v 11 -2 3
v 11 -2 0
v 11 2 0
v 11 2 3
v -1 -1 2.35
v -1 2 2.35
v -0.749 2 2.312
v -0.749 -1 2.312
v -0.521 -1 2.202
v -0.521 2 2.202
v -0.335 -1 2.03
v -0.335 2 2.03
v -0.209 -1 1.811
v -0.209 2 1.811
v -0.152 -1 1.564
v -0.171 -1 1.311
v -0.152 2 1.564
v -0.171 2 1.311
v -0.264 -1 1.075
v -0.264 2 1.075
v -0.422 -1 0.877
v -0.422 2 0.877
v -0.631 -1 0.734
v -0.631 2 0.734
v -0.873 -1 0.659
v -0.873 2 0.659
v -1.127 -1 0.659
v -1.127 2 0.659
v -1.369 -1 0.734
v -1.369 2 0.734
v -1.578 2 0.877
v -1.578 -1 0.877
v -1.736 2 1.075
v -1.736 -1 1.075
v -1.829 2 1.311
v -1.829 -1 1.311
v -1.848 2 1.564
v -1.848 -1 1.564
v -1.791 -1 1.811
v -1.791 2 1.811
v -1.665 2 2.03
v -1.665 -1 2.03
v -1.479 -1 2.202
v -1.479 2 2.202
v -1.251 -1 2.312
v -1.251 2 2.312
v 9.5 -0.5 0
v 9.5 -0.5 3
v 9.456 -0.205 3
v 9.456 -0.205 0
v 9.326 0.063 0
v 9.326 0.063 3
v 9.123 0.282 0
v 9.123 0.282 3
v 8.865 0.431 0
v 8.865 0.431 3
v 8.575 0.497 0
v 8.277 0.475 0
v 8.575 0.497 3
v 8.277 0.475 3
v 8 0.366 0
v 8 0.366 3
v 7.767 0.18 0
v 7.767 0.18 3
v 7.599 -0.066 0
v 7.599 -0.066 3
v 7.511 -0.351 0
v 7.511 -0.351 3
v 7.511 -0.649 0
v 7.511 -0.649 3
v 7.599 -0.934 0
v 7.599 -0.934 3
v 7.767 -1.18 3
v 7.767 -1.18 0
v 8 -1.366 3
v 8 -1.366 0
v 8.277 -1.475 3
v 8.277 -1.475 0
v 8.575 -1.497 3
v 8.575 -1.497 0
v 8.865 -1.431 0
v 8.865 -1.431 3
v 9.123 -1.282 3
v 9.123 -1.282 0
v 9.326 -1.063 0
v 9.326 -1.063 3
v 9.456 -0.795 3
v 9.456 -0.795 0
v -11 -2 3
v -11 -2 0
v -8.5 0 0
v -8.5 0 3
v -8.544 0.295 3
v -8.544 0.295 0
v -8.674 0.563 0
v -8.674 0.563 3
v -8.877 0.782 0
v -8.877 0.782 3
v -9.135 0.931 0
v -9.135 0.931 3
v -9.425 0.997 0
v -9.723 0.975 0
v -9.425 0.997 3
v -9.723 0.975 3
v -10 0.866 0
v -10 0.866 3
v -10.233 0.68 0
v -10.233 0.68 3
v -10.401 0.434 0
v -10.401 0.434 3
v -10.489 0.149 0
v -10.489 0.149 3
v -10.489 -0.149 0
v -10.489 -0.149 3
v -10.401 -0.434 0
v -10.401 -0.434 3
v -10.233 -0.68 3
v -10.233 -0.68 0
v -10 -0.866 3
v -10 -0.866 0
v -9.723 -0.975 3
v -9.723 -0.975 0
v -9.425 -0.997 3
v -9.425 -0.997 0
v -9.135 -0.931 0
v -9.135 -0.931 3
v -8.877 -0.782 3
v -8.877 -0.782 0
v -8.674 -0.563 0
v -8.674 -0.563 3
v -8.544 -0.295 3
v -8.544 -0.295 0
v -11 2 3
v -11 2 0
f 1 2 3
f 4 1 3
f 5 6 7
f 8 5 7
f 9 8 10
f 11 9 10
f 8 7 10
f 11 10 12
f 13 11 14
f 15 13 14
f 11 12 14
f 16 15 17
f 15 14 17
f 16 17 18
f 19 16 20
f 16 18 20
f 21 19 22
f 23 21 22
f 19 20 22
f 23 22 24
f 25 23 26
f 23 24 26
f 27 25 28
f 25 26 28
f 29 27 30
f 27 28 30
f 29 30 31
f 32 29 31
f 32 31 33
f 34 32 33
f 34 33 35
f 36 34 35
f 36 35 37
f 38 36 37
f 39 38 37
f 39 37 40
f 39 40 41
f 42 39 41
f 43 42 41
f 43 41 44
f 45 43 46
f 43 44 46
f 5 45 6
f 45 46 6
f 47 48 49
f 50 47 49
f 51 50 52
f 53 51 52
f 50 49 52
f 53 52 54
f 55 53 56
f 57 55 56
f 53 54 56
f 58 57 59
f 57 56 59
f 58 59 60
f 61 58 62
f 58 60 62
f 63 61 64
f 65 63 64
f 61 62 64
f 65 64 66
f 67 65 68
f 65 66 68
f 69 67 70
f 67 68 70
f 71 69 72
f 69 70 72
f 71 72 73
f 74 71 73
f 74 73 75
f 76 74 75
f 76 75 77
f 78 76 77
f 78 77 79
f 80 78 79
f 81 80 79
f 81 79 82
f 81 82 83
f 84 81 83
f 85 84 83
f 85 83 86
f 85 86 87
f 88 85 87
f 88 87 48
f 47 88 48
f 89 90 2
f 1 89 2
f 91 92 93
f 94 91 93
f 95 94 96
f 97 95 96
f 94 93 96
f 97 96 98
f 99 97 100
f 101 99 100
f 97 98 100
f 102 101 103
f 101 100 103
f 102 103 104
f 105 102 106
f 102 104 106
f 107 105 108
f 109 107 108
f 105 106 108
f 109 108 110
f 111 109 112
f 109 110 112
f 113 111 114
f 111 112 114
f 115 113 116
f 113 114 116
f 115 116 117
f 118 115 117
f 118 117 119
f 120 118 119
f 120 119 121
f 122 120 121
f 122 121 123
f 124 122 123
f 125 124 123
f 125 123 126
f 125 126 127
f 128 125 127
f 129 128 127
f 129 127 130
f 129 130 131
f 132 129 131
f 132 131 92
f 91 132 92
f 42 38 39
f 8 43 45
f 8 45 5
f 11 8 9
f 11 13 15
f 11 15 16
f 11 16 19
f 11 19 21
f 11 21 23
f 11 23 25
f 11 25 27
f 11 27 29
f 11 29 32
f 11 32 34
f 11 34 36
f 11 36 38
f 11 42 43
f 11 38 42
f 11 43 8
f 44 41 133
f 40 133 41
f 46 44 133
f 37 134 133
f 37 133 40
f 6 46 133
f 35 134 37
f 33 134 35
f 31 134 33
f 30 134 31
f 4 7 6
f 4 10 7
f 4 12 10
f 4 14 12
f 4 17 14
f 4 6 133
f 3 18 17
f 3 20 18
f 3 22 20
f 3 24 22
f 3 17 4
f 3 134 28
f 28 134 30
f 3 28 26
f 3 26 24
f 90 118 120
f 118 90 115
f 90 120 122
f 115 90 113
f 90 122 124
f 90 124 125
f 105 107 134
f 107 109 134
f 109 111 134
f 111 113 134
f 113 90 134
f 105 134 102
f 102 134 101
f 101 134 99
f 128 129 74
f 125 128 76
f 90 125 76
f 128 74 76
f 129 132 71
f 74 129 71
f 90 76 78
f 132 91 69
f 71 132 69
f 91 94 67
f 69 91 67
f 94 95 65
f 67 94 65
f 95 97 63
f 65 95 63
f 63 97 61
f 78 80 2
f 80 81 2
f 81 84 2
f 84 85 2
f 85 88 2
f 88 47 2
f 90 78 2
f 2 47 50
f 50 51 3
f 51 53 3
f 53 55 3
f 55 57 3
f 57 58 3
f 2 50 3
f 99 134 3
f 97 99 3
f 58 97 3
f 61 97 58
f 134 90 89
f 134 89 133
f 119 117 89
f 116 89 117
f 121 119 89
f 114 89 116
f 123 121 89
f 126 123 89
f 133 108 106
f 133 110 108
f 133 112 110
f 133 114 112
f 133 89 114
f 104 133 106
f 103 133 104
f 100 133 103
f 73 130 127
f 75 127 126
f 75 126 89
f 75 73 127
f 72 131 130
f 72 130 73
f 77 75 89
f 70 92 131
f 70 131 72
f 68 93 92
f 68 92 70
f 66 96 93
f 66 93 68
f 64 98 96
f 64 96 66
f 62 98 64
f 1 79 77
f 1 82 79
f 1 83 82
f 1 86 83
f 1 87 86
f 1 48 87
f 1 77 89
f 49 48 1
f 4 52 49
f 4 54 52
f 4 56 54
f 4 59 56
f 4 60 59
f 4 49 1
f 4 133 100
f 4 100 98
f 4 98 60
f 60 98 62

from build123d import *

# Parameters (mm, degrees)
CROQUIS1_W              = 22
CROQUIS1_H              = 4
SALIENTE_EXTRUIR1_DEPTH = 3
CROQUIS2_R              = 0.85
CORTAR_EXTRUIR1_DEPTH   = 3
CORTAR_EXTRUIR2_REACH   = 13.576
CROQUIS3_R              = 1


with BuildPart() as part:
    # Croquis1 → Saliente-Extruir1 (new body)
    with BuildSketch(Plane.XY):
        Rectangle(CROQUIS1_W, CROQUIS1_H)
    extrude(amount=SALIENTE_EXTRUIR1_DEPTH)

    # Croquis2 → Cortar-Extruir1 (cut)
    with BuildSketch(Plane(origin=(0, 2, 0), x_dir=(1, 0, 0), z_dir=(0, 1, 0))):
        with Locations(Location((-1, -1.5, 0), (0, 0, 270))):
            Circle(CROQUIS2_R)
    extrude(amount=-CORTAR_EXTRUIR1_DEPTH, mode=Mode.SUBTRACT)

    # Croquis3 → Cortar-Extruir2 (cut, up to next)
    with BuildSketch(Plane.XY.offset(3), mode=Mode.PRIVATE) as cortar_extruir2_sk1:
        with Locations((8.5, -0.5)):
            Circle(CROQUIS3_R)
    cortar_extruir2_tool1 = extrude(cortar_extruir2_sk1.sketch, amount=-CORTAR_EXTRUIR2_REACH, mode=Mode.PRIVATE) & part.part
    # Croquis3 → Cortar-Extruir2 (cut, up to next)
    with BuildSketch(Plane.XY.offset(3), mode=Mode.PRIVATE) as cortar_extruir2_sk2:
        with Locations((-9.5, 0)):
            Circle(CROQUIS3_R)
    cortar_extruir2_tool2 = extrude(cortar_extruir2_sk2.sketch, amount=-CORTAR_EXTRUIR2_REACH, mode=Mode.PRIVATE) & part.part
    add(cortar_extruir2_tool1.solids().sort_by_distance((8.5, -0.5, 3))[0], mode=Mode.SUBTRACT)
    add(cortar_extruir2_tool2.solids().sort_by_distance((-9.5, 0, 3))[0], mode=Mode.SUBTRACT)


solid = part.part
